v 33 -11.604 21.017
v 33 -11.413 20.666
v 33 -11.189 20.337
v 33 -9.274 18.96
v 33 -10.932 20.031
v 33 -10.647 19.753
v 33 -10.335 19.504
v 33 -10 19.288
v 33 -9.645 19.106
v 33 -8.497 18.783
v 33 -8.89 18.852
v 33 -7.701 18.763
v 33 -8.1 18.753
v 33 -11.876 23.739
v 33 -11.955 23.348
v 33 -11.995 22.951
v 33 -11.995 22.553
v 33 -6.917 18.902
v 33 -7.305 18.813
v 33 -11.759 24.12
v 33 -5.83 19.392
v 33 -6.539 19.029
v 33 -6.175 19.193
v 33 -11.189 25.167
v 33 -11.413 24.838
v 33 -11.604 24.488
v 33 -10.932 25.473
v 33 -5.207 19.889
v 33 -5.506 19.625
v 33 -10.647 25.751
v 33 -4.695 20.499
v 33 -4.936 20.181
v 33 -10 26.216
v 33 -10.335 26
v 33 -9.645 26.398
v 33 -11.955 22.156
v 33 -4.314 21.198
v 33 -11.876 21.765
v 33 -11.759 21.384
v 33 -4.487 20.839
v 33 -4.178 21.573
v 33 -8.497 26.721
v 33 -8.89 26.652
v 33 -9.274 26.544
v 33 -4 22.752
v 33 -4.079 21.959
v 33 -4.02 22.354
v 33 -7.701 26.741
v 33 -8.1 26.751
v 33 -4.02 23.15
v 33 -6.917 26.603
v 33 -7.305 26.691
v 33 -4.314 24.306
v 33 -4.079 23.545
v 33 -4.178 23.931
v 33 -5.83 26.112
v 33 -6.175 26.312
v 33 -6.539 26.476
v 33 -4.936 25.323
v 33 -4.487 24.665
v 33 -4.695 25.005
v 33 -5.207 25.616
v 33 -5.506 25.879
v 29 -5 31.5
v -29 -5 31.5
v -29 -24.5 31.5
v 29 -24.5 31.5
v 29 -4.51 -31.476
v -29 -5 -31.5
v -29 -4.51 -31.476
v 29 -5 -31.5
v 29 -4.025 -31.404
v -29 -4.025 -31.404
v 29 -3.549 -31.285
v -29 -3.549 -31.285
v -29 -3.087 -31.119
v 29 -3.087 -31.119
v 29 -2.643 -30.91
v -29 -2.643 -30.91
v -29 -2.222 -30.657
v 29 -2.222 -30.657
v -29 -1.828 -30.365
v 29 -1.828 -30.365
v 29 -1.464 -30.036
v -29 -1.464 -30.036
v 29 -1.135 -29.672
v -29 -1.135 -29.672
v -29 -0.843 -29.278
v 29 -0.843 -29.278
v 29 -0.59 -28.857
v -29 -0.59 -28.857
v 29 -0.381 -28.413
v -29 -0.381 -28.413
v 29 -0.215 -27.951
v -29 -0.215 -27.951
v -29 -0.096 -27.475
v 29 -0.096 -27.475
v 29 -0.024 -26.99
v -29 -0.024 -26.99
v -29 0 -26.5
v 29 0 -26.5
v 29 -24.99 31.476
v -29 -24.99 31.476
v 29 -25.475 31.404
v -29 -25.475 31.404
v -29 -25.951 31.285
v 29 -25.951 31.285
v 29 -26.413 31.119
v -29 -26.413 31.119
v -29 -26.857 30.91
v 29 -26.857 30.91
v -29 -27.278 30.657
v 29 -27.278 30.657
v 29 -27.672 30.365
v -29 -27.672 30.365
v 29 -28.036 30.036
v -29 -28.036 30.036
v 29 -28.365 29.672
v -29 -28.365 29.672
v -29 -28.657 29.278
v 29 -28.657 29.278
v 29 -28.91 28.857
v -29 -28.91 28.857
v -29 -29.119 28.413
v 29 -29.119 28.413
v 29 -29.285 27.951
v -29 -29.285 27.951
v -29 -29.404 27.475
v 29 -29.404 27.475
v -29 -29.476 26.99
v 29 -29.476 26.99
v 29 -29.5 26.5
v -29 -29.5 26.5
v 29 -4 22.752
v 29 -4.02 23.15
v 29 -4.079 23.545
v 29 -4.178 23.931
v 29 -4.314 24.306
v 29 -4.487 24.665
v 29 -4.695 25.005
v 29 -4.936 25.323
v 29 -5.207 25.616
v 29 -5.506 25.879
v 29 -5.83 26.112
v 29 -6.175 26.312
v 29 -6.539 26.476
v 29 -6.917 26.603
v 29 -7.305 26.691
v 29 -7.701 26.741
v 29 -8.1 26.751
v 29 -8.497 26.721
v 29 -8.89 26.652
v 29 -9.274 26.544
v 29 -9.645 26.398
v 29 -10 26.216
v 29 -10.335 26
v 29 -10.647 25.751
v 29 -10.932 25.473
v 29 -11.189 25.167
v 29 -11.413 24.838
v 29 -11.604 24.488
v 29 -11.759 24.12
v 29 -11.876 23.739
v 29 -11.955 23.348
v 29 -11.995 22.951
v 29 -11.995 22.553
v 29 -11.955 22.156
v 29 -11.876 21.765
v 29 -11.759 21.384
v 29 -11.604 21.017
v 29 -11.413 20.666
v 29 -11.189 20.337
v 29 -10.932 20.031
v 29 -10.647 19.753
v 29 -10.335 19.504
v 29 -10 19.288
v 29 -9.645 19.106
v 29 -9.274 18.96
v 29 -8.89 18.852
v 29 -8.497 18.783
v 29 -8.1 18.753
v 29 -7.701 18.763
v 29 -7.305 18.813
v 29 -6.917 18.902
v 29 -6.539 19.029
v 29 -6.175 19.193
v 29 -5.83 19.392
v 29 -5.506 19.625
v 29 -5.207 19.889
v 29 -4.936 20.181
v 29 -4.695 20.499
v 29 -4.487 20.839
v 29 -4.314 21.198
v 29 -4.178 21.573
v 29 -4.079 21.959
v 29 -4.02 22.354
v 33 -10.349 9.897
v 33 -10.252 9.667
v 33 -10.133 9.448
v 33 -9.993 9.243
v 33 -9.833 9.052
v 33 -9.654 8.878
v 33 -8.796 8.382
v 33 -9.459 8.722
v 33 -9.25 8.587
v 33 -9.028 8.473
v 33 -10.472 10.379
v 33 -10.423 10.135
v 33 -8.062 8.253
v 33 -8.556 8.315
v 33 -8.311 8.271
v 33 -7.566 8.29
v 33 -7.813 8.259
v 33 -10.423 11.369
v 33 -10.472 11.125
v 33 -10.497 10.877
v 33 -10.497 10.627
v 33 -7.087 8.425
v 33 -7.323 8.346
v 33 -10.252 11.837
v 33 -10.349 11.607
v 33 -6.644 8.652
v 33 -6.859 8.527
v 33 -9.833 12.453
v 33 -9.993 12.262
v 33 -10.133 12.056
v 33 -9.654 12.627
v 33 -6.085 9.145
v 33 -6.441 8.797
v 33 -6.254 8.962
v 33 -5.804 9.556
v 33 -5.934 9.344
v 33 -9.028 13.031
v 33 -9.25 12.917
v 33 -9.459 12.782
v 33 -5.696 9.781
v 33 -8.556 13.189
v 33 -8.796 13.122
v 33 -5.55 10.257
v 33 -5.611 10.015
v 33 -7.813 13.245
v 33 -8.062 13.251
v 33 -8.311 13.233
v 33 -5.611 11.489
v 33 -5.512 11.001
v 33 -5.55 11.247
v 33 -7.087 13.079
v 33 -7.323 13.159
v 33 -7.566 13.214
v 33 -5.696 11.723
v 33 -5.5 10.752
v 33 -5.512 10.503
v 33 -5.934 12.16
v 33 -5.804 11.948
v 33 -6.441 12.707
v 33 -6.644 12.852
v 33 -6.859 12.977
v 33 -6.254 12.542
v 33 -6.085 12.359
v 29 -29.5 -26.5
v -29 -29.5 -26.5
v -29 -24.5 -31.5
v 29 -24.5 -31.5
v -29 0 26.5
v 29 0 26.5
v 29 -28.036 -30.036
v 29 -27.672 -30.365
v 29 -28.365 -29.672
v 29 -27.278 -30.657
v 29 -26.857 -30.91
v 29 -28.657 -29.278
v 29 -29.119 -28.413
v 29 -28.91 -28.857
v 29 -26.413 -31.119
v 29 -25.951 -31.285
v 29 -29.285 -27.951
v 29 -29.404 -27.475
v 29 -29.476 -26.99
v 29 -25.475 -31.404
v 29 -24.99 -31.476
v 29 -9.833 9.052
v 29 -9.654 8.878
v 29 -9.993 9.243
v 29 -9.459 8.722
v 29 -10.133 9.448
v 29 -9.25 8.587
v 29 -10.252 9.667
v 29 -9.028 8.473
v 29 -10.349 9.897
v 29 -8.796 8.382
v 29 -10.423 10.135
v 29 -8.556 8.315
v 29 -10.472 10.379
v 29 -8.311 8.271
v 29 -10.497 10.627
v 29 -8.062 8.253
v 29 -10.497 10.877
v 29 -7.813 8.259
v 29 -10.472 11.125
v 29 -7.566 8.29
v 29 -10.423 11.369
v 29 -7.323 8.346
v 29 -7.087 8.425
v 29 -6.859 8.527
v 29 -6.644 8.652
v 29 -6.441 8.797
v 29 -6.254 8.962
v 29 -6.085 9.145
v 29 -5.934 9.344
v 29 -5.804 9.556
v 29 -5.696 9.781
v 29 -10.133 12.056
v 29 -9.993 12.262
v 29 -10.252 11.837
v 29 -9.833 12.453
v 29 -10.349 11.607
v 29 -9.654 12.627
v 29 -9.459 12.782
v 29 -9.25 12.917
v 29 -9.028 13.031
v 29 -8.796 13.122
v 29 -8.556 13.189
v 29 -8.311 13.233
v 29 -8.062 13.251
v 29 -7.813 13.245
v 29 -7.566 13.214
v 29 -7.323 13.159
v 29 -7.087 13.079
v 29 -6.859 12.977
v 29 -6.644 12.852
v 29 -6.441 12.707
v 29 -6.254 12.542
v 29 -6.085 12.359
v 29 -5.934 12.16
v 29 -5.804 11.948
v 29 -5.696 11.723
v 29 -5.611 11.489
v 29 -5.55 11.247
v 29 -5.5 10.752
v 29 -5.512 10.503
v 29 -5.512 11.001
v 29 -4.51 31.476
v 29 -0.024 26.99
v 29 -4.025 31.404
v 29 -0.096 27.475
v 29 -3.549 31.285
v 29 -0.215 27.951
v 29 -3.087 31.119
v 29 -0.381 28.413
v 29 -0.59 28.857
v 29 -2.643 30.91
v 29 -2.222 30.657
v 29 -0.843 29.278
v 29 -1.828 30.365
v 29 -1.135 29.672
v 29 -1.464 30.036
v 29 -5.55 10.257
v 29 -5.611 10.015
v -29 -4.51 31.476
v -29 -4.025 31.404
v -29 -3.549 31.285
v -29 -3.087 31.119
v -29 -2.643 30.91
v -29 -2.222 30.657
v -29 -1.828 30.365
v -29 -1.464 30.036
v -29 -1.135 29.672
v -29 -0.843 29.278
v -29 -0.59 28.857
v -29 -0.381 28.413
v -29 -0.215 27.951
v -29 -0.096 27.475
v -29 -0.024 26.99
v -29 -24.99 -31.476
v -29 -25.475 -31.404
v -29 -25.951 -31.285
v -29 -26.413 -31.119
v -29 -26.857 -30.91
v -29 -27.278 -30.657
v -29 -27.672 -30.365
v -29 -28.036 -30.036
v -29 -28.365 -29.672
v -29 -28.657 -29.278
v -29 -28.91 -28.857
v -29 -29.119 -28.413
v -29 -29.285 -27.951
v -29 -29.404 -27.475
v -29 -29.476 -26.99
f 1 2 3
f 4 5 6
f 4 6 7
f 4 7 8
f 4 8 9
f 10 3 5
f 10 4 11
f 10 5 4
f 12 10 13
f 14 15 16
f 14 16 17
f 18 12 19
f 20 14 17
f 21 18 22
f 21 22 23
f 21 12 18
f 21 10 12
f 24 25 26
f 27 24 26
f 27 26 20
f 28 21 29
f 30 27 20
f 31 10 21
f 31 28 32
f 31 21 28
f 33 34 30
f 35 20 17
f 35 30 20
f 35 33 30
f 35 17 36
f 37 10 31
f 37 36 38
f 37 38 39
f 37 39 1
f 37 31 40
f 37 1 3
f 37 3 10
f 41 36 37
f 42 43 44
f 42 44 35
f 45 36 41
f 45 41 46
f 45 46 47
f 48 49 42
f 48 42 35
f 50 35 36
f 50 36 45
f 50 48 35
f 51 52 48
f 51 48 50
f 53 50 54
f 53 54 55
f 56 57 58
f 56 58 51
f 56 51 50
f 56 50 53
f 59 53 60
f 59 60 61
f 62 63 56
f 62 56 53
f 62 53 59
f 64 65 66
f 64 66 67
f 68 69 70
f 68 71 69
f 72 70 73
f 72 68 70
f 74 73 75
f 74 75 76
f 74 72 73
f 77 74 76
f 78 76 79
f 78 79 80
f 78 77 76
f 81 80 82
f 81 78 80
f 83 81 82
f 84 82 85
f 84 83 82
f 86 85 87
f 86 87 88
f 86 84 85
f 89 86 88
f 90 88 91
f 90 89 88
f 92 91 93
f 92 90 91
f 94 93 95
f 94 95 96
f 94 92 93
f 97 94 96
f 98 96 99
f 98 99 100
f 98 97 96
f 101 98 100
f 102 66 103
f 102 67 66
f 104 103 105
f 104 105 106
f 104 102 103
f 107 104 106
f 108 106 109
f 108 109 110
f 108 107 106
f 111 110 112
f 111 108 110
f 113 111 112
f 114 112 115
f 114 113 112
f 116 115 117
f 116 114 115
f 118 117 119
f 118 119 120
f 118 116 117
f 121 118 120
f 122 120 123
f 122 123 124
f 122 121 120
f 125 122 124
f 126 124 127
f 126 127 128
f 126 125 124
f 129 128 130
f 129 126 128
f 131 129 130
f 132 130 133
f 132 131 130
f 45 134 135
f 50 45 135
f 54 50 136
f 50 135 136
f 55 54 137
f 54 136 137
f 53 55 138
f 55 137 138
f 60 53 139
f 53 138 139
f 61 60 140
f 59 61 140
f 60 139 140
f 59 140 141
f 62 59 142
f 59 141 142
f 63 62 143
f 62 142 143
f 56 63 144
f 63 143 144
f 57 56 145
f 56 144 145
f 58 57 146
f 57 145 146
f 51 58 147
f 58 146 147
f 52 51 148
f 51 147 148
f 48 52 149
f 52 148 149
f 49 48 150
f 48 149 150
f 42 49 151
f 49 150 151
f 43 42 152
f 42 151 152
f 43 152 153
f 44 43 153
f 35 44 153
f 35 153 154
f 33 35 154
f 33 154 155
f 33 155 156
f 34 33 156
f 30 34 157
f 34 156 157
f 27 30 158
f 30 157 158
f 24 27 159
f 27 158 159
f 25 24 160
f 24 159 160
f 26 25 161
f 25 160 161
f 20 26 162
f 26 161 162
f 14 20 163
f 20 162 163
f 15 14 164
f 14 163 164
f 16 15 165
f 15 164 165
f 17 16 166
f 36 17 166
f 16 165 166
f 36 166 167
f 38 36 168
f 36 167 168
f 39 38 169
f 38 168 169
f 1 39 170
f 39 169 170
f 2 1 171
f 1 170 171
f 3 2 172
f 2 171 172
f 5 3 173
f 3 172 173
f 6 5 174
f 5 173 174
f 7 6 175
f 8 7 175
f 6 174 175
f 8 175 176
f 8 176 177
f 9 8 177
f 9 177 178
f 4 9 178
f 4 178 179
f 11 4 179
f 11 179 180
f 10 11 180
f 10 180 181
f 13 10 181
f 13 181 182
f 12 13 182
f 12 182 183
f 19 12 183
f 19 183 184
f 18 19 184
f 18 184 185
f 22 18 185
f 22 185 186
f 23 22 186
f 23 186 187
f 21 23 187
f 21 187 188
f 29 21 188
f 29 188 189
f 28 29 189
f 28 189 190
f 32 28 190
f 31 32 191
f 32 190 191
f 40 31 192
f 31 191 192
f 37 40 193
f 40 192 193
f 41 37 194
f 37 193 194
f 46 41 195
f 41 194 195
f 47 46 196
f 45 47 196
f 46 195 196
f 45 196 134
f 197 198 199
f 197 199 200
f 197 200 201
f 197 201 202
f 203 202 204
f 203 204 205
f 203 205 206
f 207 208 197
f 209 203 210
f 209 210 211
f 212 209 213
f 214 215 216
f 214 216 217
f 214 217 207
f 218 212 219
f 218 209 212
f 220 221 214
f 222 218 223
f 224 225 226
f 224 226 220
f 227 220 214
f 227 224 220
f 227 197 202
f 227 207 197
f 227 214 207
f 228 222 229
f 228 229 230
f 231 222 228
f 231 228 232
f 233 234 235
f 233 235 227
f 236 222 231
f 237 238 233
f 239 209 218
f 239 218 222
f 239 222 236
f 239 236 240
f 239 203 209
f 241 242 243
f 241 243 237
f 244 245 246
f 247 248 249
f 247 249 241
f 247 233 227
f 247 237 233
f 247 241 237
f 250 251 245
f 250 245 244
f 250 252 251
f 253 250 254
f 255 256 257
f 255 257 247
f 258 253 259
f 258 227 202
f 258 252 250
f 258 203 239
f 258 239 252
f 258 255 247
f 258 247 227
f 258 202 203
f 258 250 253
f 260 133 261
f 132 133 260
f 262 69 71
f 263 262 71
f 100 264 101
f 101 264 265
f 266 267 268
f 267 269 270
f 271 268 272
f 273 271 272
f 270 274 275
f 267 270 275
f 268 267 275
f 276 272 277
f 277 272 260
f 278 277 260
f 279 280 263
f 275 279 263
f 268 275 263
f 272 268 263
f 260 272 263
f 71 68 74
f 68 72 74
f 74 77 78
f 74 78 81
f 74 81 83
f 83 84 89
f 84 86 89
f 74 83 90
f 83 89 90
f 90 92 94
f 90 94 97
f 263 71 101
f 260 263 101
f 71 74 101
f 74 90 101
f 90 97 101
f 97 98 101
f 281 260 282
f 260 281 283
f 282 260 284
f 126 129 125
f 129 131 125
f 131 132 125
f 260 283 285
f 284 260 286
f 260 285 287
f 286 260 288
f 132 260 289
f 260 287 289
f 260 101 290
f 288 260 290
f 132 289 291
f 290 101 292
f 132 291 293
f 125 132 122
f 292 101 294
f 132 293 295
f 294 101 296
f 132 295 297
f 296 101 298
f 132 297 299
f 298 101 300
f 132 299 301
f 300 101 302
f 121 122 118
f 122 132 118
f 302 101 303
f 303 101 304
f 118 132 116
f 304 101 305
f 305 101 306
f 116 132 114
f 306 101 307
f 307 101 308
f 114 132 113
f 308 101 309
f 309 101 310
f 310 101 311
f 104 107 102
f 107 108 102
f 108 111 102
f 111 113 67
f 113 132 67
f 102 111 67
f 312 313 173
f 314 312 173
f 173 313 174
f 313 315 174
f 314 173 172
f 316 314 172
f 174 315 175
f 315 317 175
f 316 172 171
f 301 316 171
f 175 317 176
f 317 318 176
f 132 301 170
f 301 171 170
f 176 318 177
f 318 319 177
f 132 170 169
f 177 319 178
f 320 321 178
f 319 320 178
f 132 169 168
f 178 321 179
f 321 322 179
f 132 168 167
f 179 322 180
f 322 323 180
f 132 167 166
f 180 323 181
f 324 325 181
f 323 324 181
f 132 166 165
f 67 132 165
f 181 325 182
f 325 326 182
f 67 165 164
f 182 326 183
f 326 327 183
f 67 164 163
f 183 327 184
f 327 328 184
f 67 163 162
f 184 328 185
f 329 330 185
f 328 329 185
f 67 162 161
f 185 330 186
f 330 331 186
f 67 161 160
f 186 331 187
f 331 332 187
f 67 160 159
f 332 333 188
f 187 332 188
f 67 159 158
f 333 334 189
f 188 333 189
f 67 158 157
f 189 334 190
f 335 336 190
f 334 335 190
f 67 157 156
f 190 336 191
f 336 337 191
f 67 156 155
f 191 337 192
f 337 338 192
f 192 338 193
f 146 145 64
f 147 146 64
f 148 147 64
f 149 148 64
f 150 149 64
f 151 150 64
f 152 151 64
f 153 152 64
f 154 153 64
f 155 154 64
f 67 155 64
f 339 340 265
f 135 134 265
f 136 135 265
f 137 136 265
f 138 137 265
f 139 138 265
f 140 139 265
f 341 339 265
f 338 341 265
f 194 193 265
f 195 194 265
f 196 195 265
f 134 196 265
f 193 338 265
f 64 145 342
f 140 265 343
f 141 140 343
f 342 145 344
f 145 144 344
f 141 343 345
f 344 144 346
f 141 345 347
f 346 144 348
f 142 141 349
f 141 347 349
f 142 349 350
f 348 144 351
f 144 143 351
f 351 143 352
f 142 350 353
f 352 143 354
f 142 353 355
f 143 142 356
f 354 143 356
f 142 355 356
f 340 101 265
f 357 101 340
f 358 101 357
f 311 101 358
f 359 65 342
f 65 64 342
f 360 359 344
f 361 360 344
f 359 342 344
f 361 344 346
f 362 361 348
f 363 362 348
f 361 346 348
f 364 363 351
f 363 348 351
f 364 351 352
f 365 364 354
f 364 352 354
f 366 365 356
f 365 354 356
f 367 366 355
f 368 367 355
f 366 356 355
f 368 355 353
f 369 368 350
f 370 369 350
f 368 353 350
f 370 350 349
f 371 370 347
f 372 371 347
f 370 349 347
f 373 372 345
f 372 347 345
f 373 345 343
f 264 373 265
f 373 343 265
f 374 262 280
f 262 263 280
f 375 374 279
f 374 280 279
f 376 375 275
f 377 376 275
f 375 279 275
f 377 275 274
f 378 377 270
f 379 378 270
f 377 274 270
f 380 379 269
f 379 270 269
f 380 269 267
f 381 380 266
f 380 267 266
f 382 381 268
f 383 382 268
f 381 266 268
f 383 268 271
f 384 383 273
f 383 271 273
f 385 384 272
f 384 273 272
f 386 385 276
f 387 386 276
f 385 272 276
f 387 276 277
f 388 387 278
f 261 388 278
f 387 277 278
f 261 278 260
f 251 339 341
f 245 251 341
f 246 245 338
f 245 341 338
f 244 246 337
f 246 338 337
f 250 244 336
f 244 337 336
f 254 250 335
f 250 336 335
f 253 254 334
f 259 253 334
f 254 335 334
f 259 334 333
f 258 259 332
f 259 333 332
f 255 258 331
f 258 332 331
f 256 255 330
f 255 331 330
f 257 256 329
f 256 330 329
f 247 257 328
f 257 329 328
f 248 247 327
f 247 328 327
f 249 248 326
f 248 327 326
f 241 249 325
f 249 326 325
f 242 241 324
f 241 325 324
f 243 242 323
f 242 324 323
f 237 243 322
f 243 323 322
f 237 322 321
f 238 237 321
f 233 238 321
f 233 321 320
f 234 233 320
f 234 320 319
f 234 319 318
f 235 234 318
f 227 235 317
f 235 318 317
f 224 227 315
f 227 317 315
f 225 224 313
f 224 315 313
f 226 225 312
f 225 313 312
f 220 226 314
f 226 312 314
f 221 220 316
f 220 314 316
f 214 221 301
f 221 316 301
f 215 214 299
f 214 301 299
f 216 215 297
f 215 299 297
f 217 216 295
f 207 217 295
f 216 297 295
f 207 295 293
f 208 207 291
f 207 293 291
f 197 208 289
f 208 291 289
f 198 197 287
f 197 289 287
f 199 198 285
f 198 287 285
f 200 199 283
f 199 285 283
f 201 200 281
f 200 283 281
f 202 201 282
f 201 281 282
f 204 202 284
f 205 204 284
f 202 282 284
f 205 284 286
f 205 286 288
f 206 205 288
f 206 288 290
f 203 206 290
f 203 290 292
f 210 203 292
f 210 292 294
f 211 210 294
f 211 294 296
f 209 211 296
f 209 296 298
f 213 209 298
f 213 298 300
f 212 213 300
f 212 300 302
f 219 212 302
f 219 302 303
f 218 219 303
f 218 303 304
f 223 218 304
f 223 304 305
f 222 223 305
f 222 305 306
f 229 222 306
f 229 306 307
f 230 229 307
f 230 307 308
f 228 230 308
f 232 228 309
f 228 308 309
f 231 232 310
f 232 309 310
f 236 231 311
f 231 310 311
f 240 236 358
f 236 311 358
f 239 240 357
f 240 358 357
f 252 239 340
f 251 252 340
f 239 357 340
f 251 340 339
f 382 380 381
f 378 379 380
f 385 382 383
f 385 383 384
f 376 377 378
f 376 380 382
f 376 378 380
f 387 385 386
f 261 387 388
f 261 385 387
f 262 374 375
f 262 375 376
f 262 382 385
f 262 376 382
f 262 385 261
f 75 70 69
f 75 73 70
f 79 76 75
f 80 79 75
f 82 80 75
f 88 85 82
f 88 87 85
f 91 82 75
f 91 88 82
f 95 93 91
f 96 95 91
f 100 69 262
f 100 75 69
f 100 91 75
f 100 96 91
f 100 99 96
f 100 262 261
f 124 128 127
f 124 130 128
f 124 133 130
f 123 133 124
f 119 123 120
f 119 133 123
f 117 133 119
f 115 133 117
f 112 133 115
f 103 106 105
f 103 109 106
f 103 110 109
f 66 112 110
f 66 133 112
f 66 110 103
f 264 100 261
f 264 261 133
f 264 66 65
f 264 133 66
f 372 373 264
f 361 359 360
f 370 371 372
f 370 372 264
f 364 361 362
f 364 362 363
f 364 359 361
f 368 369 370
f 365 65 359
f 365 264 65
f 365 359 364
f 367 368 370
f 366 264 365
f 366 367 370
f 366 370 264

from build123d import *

# Parameters (mm, degrees)
F0_W     = 58
F0_H     = 63
F1_DEPTH = 29.5
F2_R     = 5
F3_R     = 4
F3_R_2   = 2.5
F4_DEPTH = 4


with BuildPart() as f1:
    # F0 (on Front) → F1 (new body)
    with BuildSketch(Plane.XZ):
        Rectangle(F0_W, F0_H)
    extrude(amount=F1_DEPTH)

    # F2
    f2_edges = [f1.edges().sort_by_distance(p)[0] for p in [
        (0, 0, 31.5),
        (0, 0, -31.5),
        (0, -29.5, -31.5),
        (0, -29.5, 31.5),
    ]]
    fillet(f2_edges, radius=F2_R)

    # F3 (on face) → F4 (join)
    with BuildSketch(Plane.YZ.offset(29)):
        with Locations((-8, 22.752069)):
            Circle(F3_R)
        with Locations((-8, 10.752069)):
            Circle(F3_R_2)
    extrude(amount=F4_DEPTH)


solid = f1.part
